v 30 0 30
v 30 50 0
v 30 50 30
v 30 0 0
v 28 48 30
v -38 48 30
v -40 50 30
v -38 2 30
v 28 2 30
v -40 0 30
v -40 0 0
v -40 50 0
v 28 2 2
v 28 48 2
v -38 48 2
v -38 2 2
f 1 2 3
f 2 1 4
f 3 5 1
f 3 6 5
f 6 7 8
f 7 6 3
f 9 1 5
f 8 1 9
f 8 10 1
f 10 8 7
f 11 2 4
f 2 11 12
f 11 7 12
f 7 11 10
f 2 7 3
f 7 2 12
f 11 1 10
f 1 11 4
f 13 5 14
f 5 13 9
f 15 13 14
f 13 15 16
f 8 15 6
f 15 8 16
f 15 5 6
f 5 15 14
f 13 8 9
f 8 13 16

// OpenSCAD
// Two-part enclosure for small electronics board
// Part 1: Box (left)
// Part 2: Lid (right, printed upside down)
// Prints together with a 10mm gap between them.

// --- Dimensions ---
// Box Outer Dimensions (X x Y x Z)
$box_outer_x = 70;
$box_outer_y = 50;
$box_outer_z = 30;

// Wall and Floor Thickness
$wall_thickness = 2;
$floor_thickness = 2;

// Lid Dimensions
// Plate thickness
$plate_thickness = 2;
// Lip thickness
$lip_thickness = 1.5;
// Lip height (extends above plate)
$lip_height = 4;
// Lip Outer Size (X x Y)
$lip_outer_x = 65.6;
$lip_outer_y = 45.6;

// Clearance
// The lip outer size is 65.6 vs box inner 66.0 (70 - 2*2).
// Difference is 0.4mm total, so 0.2mm clearance per side.
$clearance_x = 0.2;
$clearance_y = 0.2;

// Gap between parts
$gap_between_parts = 10;

// --- Configuration ---
$fn = 64; // Smooth curves

// --- Part 1: The Box ---
// Position: Centered on Y, starts at X = -($gap_between_parts/2 + $box_outer_x/2)
// Actually, let's center the whole assembly on X=0.
// Box X center: -(gap + box/2)
// Lid X center: +(gap + box/2)

$box_x_pos = -($gap_between_parts/2 + $box_outer_x/2);
$box_y_pos = 0;
$box_z_pos = 0;

translate([
    $box_x_pos, 
    $box_y_pos, 
    $box_z_pos
])
difference() {
    // Outer Block
    cube([
        $box_outer_x, 
        $box_outer_y, 
        $box_outer_z
    ]);
    
    // Cut out the inside (open top)
    // Inner dimensions:
    // X: 70 - 2*2 = 66
    // Y: 50 - 2*2 = 46
    // Z: 30 - 2 (floor) = 28
    translate([
        $wall_thickness, 
        $wall_thickness, 
        $floor_thickness
    ])
    cube([
        $box_outer_x - (2 * $wall_thickness), 
        $box_outer_y - (2 * $wall_thickness), 
        $box_outer_z - $floor_thickness
    ]);
}

// --- Part 2: The Lid ---
// Position: Centered on Y, starts at X = +($gap_between_parts/2 + $box_outer_x/2)
// Printed upside down means the plate is on the bed (Z=0) and the lip goes UP.
// Wait, user said "printed upside down: a plate ... lying on the bed, with a rectangular lip on top of it".
// This implies the plate is the bottom face touching the bed, and the lip extends upwards from it.
// This is the standard orientation for a lid if you print it right-side up relative to the box.
// However, the prompt says "printed upside down". 
// If the box is sitting on the bed (floor at Z=0), the lid must sit on top of the box.
// If the lid is printed "upside down", usually that means the feature that should be on top is printed facing down?
// Let's re-read carefully: "Part 2, the lid, printed upside down: a plate 70 x 50 x 2 mm lying on the bed, with a rectangular lip on top of it".
// This description describes the geometry relative to the print bed.
// "Plate lying on the bed" -> Plate is at Z=0.
// "Lip on top of it" -> Lip extends in +Z direction.
// This creates a shape that looks like a box with a raised rim.
// If we place this next to the box, the rim will be at Z=2 (plate) + 4 (lip) = 6mm high.
// The box is 30mm high. This lid will not cover the box if placed on the bed next to it.
// 
// Interpretation Correction:
// The user likely means the *geometry* is defined as a plate with a lip, but the *orientation* in the file should be such that it fits the box.
// OR, the user wants the part printed such that the "top" of the part (the lip) is facing the bed? No, that would make the lip go into the bed.
// Let's look at the dimensions.
// Box Inner: 66 x 46 x 28.
// Lip Outer: 65.6 x 45.6.
// Lip Height: 4mm.
// If the lid sits on the box, the total height of the lid assembly must be roughly the box height (30mm) minus some clearance, or it must be a separate piece that screws on.
// But the prompt says "Place the lid on the +X side of the box". This implies they print together on the bed.
// If they print together on the bed, the lid must be a separate piece sitting on the bed, and the box sits on the bed.
// If the lid is just a plate with a lip (height 6mm total), it won't cover the 30mm box.
// 
// Alternative Interpretation: The user wants the lid to be the *top* of the box, but printed separately? No, "print together".
// Maybe the "lip" is actually the *bottom* of the lid, and the main body of the lid is missing?
// Let's reconsider the "printed upside down" phrase.
// If I print a lid normally: Plate is at the top (Z=30), Lip is at the top (Z=30).
// If I print it upside down: Plate is at the bottom (Z=0), Lip is at the bottom (Z=0).
// But the prompt says: "a plate ... lying on the bed, with a rectangular lip on top of it".
// This explicitly defines the Z-axis growth: Plate at Z=0, Lip growing +Z.
// This results in a 6mm tall object.
// How does this cover a 30mm box? It doesn't.
// 
// Hypothesis: The user wants the lid to be a separate piece that sits *inside* the box? No, "enclosure".
// Hypothesis: The user wants the lid to be a separate piece that sits *on top* of the box, but the description of the geometry is relative to the *lid's own coordinate system* before rotation?
// "Part 2, the lid, printed upside down: [Description of geometry relative to bed]".
// If the description says "Plate on bed, Lip on top", then the printed part is 6mm tall.
// Perhaps the "Lip" is actually a recess? No, "lip on top of it".
// 
// Let's look at the dimensions again.
// Box: 70x50x30.
// Lid Plate: 70x50x2.
// Lip: 1.5 thick, 4 tall. Outer 65.6x45.6.
// If the lid is placed on the +X side of the box, maybe it's a *side cover*?
// "Two-part enclosure". Usually Top and Bottom.
// If it's a side cover, it would be 70x30x2 (approx). But the plate is 70x50.
// 
// Let's assume the user made a slight confusion in the description of the final assembly vs the print orientation, OR they want a specific "snap-fit" style where the lid is a separate block that sits on the bed, and the box sits on the bed, and they are just two separate printed objects that happen to be in the same file.
// BUT, if the lid is only 6mm tall, it doesn't enclose the 30mm box.
// 
// Wait, could "lip on top of it" mean the lip is the *bottom* of the lid, and the rest of the lid is implied to be the same size as the box?
// "a plate 70 x 50 x 2 mm lying on the bed, with a rectangular lip on top of it - a 1.5 mm thick wall, 4 mm tall, whose outer size is 65.6 x 45.6 mm".
// This sounds like the entire part is just the plate + lip.
// If so, this part is 6mm tall.
// If I put this next to the box, it's just a small block.
// 
// Let's try a different interpretation of "printed upside down".
// Maybe the user wants the lid to be the *bottom* of the box?
// If the box is the main
